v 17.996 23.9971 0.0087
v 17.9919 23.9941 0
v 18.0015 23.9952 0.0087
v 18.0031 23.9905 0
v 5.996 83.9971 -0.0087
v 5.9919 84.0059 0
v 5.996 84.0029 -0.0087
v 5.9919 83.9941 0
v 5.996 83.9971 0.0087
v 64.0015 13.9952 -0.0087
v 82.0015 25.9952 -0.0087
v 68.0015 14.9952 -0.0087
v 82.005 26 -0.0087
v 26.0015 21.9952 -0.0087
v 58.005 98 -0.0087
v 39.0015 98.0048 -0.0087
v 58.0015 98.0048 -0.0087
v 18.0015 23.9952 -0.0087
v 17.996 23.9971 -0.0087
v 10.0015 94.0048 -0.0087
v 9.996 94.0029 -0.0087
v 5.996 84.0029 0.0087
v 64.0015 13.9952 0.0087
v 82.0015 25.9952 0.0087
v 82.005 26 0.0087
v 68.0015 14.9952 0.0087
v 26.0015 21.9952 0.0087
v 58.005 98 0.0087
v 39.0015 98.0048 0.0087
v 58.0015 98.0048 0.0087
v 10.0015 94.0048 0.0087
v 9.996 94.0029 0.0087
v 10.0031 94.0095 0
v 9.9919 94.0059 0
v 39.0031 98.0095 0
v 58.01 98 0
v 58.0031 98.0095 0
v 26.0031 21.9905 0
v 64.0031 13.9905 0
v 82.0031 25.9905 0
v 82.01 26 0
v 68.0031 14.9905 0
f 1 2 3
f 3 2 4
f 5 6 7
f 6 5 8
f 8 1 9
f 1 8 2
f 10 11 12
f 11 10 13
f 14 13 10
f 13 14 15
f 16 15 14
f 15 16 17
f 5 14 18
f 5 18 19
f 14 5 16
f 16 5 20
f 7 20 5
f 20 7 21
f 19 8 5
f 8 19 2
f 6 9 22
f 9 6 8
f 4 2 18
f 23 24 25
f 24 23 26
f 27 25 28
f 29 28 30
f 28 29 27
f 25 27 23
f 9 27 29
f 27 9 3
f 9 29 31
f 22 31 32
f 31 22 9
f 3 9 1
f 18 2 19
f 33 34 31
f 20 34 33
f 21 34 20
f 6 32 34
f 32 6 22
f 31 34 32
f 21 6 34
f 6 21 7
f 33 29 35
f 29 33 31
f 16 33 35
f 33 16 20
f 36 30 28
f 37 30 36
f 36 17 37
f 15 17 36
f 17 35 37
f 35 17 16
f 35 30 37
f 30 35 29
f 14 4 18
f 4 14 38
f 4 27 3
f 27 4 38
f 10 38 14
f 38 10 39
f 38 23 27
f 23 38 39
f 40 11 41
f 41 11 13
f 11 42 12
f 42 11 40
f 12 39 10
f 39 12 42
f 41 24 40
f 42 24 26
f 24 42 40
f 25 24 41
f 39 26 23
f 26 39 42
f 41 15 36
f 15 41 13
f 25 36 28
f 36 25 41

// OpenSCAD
color([0.3519350680925015,0.6477014615427978,0.14125726454845833]) hull(){
    translate([18,24]) sphere(0.01);
    translate([6,84]) sphere(0.01);
    translate([18,58]) sphere(0.01);
}
color([0.23013900541024712,0.8285218163248013,0.9603761550286747]) hull(){
    translate([6,84]) sphere(0.01);
    translate([10,94]) sphere(0.01);
    translate([22,90]) sphere(0.01);
}
color([0.6050710034948523,0.017553655236826726,0.43262871278032167]) hull(){
    translate([6,84]) sphere(0.01);
    translate([18,58]) sphere(0.01);
    translate([22,90]) sphere(0.01);
}
color([0.2571490251669072,0.4480229944680496,0.14517873337393172]) hull(){
    translate([10,94]) sphere(0.01);
    translate([39,98]) sphere(0.01);
    translate([22,90]) sphere(0.01);
}
color([0.8405131005933094,0.9776834869331054,0.10300019528175153]) hull(){
    translate([22,90]) sphere(0.01);
    translate([50,93]) sphere(0.01);
    translate([39,98]) sphere(0.01);
}
color([0.998153073210626,0.8535026464000083,0.6855970549077809]) hull(){
    translate([39,98]) sphere(0.01);
    translate([58,98]) sphere(0.01);
    translate([50,93]) sphere(0.01);
}
color([0.7995005100691247,0.34047238184459006,0.1286635278612125]) hull(){
    translate([18,58]) sphere(0.01);
    translate([18,24]) sphere(0.01);
    translate([42,29]) sphere(0.01);
}
color([0.6020598448119898,0.9167847797194366,0.02081986636819022]) hull(){
    translate([18,24]) sphere(0.01);
    translate([26,22]) sphere(0.01);
    translate([42,29]) sphere(0.01);
}
color([0.9135118305629362,0.3823609034395232,0.42581309278619206]) hull(){
    translate([26,22]) sphere(0.01);
    translate([64,14]) sphere(0.01);
    translate([42,29]) sphere(0.01);
}
color([0.08967296065919184,0.0016857337534631478,0.31287848776698257]) hull(){
    translate([18,58]) sphere(0.01);
    translate([42,29]) sphere(0.01);
    translate([44,47]) sphere(0.01);
}
color([0.09731792302828757,0.364404074066101,0.8754307508322564]) hull(){
    translate([18,58]) sphere(0.01);
    translate([44,55]) sphere(0.01);
    translate([44,47]) sphere(0.01);
}
color([0.6967090939923642,0.5776053806129825,0.18685318159950626]) hull(){
    translate([18,58]) sphere(0.01);
    translate([22,90]) sphere(0.01);
    translate([44,55]) sphere(0.01);
}
color([0.9585806736472646,0.593334846568766,0.09927504601217696]) hull(){
    translate([22,90]) sphere(0.01);
    translate([50,93]) sphere(0.01);
    translate([44,55]) sphere(0.01);
}
color([0.19313665173925,0.6863688301261038,0.2093263356404984]) hull(){
    translate([50,93]) sphere(0.01);
    translate([58,98]) sphere(0.01);
    translate([44,55]) sphere(0.01);
}
color([0.2694340379225941,0.24598969558588324,0.16092298384524362]) hull(){
    translate([58,98]) sphere(0.01);
    translate([44,55]) sphere(0.01);
    translate([58,33]) sphere(0.01);
}
color([0.5102606956149307,0.431705445139412,0.38909399282504675]) hull(){
    translate([44,55]) sphere(0.01);
    translate([42,29]) sphere(0.01);
    translate([44,47]) sphere(0.01);
}
color([0.3194819673674283,0.6655357355223767,0.22692357675811492]) hull(){
    translate([44,55]) sphere(0.01);
    translate([58,33]) sphere(0.01);
    translate([42,29]) sphere(0.01);
}
color([0.9464906820257937,0.35776616524050997,0.9421064453260054]) hull(){
    translate([42,29]) sphere(0.01);
    translate([64,14]) sphere(0.01);
    translate([58,33]) sphere(0.01);
}
color([0.3792404853118415,0.27508202782836655,0.9368074710650367]) hull(){
    translate([64,14]) sphere(0.01);
    translate([68,15]) sphere(0.01);
    translate([82,26]) sphere(0.01);
}
color([0.7670397757471089,0.17483880300164423,0.7474114244696689]) hull(){
    translate([64,14]) sphere(0.01);
    translate([58,33]) sphere(0.01);
    translate([82,26]) sphere(0.01);
}
color([0.6015236368594579,0.5872808850844162,0.28390336255679416]) hull(){
    translate([58,98]) sphere(0.01);
    translate([58,33]) sphere(0.01);
    translate([82,26]) sphere(0.01);
}
